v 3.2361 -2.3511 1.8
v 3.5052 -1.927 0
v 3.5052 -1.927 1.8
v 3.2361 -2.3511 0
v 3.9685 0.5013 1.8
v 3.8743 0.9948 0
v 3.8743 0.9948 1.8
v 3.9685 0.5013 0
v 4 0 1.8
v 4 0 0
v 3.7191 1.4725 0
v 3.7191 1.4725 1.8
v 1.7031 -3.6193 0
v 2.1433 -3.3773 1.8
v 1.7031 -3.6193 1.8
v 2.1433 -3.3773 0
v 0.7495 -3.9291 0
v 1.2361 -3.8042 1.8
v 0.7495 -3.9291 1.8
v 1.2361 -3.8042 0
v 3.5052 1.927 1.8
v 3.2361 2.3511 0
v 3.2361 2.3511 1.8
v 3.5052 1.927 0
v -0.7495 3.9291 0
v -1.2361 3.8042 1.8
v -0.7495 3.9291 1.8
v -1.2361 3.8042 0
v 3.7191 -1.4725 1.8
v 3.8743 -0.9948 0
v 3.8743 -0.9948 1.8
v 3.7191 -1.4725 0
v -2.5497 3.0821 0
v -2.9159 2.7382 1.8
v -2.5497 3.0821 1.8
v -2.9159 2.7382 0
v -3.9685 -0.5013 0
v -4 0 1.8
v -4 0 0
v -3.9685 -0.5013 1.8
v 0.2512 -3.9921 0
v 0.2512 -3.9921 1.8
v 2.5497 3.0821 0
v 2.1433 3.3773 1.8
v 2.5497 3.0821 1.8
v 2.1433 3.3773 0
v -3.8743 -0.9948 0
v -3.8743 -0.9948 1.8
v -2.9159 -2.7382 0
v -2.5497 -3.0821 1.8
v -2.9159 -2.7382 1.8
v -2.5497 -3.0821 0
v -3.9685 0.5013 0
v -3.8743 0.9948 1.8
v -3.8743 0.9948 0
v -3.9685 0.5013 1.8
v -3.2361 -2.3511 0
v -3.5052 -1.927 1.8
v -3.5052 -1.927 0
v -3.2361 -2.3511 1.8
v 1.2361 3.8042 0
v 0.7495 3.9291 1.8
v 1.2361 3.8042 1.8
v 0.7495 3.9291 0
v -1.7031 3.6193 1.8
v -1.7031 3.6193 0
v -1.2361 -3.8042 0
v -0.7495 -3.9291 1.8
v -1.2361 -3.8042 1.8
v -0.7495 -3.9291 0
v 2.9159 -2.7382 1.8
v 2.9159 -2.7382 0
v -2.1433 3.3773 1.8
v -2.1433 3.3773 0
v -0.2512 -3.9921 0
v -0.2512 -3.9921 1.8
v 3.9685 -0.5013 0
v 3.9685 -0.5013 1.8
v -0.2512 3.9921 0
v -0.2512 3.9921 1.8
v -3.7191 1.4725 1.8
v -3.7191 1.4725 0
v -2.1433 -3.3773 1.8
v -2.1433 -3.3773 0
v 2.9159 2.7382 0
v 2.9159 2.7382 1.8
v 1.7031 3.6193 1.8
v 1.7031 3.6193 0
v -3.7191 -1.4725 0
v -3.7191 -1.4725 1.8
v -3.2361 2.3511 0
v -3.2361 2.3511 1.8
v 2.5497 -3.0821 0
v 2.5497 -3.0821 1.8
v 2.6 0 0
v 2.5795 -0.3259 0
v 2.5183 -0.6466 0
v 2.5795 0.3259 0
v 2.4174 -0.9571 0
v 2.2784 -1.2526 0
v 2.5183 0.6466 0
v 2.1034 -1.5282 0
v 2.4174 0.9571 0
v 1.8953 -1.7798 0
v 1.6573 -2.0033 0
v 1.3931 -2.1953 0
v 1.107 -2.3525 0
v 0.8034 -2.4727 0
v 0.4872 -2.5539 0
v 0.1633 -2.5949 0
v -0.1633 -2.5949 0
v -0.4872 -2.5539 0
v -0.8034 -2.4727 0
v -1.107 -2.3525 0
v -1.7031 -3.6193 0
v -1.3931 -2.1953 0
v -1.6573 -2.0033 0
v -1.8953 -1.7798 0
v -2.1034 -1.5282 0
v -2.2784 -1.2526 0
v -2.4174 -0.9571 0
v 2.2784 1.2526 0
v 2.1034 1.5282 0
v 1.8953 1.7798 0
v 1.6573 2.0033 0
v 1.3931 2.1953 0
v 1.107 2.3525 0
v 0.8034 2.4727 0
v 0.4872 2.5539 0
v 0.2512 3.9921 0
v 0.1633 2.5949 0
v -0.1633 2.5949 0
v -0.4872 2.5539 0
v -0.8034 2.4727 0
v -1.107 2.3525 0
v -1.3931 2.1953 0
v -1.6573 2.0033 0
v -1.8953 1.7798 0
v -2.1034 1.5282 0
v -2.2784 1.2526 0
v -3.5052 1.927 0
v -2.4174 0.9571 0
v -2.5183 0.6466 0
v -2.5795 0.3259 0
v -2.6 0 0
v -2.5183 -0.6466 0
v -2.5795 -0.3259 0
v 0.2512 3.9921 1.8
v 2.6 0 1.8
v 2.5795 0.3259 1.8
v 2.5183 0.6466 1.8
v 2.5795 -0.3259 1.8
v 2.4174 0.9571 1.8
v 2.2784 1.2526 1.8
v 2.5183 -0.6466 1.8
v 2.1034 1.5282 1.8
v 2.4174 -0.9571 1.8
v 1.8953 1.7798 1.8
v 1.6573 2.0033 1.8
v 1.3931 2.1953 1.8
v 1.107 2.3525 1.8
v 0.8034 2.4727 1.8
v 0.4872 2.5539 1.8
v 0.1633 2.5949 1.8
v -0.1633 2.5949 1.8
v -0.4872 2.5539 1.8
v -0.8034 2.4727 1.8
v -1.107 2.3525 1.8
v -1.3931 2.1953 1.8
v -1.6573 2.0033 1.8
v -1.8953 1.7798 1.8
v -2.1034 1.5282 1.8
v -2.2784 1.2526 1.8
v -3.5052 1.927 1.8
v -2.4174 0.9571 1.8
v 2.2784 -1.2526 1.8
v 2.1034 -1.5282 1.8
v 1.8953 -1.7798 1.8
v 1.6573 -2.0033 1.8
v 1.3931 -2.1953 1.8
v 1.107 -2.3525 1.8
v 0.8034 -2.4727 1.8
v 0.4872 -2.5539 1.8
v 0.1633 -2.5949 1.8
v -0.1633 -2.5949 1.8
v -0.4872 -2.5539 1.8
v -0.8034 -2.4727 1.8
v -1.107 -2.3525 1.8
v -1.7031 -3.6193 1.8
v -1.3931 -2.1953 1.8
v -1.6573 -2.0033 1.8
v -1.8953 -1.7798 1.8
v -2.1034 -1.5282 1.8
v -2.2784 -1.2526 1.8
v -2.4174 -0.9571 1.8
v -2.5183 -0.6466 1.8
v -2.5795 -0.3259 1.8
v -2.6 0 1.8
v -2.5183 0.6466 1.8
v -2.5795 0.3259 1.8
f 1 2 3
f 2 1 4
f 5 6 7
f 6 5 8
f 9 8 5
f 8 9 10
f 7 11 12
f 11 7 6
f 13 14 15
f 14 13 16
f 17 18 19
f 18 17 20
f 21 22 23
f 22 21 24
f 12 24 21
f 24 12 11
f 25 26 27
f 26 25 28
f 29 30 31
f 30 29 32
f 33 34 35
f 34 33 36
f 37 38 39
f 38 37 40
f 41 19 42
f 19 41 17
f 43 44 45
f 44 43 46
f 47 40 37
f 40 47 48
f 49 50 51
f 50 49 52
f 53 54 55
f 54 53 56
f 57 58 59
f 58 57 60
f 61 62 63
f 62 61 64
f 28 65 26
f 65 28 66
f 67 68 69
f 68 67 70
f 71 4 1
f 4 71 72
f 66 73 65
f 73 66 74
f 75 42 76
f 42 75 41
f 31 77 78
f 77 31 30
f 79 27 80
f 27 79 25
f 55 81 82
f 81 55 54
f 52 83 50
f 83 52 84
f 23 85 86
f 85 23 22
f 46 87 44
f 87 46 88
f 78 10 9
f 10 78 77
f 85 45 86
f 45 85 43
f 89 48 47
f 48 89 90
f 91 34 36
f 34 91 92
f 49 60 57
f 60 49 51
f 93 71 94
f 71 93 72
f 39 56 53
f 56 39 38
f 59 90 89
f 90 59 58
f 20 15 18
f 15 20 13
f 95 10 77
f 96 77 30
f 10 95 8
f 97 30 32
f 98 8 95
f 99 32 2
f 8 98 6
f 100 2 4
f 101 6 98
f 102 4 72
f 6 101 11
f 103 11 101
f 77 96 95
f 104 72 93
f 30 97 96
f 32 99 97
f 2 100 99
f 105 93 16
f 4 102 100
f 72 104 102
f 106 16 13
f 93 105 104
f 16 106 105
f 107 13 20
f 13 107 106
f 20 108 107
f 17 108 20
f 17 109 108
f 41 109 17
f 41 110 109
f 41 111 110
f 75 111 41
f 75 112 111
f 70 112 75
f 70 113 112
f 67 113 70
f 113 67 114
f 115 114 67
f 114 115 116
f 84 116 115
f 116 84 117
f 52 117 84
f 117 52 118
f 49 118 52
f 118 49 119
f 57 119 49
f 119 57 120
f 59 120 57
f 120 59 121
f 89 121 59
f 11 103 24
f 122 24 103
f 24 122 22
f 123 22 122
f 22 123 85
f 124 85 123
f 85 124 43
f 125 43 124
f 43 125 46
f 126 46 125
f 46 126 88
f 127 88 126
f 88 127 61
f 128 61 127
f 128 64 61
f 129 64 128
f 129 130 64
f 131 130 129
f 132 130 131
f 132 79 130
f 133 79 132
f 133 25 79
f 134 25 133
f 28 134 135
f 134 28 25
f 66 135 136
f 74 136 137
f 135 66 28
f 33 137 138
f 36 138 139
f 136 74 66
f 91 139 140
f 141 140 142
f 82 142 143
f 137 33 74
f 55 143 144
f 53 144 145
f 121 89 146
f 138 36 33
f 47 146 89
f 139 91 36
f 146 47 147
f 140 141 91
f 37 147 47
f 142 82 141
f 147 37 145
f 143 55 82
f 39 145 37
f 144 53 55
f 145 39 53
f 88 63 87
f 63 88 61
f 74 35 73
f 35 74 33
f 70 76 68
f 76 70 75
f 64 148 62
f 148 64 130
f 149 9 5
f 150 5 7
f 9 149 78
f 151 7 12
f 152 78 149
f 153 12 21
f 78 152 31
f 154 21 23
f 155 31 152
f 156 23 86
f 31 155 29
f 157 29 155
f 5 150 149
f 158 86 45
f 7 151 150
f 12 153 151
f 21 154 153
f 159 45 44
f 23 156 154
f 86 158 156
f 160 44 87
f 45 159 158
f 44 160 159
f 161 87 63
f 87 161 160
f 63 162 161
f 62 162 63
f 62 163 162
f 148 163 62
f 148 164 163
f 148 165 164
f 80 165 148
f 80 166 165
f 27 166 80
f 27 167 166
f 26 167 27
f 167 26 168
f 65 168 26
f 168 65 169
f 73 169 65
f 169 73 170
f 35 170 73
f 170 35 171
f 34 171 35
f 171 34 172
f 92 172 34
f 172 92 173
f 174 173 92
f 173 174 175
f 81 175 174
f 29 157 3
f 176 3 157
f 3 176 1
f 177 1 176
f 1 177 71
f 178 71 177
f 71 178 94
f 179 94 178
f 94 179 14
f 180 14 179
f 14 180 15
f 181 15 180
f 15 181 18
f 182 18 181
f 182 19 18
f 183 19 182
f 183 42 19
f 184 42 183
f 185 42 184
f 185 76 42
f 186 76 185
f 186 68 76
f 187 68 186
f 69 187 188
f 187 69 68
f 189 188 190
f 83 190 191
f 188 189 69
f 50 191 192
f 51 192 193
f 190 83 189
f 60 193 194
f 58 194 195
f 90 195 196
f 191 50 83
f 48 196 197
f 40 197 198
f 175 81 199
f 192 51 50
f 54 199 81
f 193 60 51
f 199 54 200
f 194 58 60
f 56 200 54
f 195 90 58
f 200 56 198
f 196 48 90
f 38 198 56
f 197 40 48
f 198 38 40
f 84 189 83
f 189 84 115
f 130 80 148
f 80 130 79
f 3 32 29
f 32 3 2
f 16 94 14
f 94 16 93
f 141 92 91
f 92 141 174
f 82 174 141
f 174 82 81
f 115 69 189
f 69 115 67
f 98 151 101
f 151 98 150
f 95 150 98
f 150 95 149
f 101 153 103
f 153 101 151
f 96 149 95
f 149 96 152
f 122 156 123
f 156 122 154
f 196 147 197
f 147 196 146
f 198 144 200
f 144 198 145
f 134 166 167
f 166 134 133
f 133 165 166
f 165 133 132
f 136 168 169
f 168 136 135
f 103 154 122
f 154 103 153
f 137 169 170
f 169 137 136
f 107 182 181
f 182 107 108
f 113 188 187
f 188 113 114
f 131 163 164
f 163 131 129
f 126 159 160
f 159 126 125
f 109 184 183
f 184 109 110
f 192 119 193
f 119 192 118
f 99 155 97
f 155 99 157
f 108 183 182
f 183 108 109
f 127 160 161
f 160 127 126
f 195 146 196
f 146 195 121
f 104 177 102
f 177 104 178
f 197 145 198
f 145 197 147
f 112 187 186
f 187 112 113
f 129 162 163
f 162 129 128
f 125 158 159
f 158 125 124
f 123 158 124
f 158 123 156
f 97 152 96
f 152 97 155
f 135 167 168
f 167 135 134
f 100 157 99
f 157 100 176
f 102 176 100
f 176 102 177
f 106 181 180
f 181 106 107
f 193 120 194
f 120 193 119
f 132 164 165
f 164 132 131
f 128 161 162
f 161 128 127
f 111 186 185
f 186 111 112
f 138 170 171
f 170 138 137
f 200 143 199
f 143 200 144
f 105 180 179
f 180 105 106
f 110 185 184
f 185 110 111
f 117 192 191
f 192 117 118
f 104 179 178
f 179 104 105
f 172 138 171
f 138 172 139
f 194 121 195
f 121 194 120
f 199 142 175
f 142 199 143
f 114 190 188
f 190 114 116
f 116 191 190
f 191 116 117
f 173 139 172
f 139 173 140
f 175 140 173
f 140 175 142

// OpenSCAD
// Alexander Saechnikov

difference() {
    cylinder(d=8, 1.8, $fn=50);
    translate([0,0,-2.1])
        cylinder(d=5.2, 4, $fn=50);
}
